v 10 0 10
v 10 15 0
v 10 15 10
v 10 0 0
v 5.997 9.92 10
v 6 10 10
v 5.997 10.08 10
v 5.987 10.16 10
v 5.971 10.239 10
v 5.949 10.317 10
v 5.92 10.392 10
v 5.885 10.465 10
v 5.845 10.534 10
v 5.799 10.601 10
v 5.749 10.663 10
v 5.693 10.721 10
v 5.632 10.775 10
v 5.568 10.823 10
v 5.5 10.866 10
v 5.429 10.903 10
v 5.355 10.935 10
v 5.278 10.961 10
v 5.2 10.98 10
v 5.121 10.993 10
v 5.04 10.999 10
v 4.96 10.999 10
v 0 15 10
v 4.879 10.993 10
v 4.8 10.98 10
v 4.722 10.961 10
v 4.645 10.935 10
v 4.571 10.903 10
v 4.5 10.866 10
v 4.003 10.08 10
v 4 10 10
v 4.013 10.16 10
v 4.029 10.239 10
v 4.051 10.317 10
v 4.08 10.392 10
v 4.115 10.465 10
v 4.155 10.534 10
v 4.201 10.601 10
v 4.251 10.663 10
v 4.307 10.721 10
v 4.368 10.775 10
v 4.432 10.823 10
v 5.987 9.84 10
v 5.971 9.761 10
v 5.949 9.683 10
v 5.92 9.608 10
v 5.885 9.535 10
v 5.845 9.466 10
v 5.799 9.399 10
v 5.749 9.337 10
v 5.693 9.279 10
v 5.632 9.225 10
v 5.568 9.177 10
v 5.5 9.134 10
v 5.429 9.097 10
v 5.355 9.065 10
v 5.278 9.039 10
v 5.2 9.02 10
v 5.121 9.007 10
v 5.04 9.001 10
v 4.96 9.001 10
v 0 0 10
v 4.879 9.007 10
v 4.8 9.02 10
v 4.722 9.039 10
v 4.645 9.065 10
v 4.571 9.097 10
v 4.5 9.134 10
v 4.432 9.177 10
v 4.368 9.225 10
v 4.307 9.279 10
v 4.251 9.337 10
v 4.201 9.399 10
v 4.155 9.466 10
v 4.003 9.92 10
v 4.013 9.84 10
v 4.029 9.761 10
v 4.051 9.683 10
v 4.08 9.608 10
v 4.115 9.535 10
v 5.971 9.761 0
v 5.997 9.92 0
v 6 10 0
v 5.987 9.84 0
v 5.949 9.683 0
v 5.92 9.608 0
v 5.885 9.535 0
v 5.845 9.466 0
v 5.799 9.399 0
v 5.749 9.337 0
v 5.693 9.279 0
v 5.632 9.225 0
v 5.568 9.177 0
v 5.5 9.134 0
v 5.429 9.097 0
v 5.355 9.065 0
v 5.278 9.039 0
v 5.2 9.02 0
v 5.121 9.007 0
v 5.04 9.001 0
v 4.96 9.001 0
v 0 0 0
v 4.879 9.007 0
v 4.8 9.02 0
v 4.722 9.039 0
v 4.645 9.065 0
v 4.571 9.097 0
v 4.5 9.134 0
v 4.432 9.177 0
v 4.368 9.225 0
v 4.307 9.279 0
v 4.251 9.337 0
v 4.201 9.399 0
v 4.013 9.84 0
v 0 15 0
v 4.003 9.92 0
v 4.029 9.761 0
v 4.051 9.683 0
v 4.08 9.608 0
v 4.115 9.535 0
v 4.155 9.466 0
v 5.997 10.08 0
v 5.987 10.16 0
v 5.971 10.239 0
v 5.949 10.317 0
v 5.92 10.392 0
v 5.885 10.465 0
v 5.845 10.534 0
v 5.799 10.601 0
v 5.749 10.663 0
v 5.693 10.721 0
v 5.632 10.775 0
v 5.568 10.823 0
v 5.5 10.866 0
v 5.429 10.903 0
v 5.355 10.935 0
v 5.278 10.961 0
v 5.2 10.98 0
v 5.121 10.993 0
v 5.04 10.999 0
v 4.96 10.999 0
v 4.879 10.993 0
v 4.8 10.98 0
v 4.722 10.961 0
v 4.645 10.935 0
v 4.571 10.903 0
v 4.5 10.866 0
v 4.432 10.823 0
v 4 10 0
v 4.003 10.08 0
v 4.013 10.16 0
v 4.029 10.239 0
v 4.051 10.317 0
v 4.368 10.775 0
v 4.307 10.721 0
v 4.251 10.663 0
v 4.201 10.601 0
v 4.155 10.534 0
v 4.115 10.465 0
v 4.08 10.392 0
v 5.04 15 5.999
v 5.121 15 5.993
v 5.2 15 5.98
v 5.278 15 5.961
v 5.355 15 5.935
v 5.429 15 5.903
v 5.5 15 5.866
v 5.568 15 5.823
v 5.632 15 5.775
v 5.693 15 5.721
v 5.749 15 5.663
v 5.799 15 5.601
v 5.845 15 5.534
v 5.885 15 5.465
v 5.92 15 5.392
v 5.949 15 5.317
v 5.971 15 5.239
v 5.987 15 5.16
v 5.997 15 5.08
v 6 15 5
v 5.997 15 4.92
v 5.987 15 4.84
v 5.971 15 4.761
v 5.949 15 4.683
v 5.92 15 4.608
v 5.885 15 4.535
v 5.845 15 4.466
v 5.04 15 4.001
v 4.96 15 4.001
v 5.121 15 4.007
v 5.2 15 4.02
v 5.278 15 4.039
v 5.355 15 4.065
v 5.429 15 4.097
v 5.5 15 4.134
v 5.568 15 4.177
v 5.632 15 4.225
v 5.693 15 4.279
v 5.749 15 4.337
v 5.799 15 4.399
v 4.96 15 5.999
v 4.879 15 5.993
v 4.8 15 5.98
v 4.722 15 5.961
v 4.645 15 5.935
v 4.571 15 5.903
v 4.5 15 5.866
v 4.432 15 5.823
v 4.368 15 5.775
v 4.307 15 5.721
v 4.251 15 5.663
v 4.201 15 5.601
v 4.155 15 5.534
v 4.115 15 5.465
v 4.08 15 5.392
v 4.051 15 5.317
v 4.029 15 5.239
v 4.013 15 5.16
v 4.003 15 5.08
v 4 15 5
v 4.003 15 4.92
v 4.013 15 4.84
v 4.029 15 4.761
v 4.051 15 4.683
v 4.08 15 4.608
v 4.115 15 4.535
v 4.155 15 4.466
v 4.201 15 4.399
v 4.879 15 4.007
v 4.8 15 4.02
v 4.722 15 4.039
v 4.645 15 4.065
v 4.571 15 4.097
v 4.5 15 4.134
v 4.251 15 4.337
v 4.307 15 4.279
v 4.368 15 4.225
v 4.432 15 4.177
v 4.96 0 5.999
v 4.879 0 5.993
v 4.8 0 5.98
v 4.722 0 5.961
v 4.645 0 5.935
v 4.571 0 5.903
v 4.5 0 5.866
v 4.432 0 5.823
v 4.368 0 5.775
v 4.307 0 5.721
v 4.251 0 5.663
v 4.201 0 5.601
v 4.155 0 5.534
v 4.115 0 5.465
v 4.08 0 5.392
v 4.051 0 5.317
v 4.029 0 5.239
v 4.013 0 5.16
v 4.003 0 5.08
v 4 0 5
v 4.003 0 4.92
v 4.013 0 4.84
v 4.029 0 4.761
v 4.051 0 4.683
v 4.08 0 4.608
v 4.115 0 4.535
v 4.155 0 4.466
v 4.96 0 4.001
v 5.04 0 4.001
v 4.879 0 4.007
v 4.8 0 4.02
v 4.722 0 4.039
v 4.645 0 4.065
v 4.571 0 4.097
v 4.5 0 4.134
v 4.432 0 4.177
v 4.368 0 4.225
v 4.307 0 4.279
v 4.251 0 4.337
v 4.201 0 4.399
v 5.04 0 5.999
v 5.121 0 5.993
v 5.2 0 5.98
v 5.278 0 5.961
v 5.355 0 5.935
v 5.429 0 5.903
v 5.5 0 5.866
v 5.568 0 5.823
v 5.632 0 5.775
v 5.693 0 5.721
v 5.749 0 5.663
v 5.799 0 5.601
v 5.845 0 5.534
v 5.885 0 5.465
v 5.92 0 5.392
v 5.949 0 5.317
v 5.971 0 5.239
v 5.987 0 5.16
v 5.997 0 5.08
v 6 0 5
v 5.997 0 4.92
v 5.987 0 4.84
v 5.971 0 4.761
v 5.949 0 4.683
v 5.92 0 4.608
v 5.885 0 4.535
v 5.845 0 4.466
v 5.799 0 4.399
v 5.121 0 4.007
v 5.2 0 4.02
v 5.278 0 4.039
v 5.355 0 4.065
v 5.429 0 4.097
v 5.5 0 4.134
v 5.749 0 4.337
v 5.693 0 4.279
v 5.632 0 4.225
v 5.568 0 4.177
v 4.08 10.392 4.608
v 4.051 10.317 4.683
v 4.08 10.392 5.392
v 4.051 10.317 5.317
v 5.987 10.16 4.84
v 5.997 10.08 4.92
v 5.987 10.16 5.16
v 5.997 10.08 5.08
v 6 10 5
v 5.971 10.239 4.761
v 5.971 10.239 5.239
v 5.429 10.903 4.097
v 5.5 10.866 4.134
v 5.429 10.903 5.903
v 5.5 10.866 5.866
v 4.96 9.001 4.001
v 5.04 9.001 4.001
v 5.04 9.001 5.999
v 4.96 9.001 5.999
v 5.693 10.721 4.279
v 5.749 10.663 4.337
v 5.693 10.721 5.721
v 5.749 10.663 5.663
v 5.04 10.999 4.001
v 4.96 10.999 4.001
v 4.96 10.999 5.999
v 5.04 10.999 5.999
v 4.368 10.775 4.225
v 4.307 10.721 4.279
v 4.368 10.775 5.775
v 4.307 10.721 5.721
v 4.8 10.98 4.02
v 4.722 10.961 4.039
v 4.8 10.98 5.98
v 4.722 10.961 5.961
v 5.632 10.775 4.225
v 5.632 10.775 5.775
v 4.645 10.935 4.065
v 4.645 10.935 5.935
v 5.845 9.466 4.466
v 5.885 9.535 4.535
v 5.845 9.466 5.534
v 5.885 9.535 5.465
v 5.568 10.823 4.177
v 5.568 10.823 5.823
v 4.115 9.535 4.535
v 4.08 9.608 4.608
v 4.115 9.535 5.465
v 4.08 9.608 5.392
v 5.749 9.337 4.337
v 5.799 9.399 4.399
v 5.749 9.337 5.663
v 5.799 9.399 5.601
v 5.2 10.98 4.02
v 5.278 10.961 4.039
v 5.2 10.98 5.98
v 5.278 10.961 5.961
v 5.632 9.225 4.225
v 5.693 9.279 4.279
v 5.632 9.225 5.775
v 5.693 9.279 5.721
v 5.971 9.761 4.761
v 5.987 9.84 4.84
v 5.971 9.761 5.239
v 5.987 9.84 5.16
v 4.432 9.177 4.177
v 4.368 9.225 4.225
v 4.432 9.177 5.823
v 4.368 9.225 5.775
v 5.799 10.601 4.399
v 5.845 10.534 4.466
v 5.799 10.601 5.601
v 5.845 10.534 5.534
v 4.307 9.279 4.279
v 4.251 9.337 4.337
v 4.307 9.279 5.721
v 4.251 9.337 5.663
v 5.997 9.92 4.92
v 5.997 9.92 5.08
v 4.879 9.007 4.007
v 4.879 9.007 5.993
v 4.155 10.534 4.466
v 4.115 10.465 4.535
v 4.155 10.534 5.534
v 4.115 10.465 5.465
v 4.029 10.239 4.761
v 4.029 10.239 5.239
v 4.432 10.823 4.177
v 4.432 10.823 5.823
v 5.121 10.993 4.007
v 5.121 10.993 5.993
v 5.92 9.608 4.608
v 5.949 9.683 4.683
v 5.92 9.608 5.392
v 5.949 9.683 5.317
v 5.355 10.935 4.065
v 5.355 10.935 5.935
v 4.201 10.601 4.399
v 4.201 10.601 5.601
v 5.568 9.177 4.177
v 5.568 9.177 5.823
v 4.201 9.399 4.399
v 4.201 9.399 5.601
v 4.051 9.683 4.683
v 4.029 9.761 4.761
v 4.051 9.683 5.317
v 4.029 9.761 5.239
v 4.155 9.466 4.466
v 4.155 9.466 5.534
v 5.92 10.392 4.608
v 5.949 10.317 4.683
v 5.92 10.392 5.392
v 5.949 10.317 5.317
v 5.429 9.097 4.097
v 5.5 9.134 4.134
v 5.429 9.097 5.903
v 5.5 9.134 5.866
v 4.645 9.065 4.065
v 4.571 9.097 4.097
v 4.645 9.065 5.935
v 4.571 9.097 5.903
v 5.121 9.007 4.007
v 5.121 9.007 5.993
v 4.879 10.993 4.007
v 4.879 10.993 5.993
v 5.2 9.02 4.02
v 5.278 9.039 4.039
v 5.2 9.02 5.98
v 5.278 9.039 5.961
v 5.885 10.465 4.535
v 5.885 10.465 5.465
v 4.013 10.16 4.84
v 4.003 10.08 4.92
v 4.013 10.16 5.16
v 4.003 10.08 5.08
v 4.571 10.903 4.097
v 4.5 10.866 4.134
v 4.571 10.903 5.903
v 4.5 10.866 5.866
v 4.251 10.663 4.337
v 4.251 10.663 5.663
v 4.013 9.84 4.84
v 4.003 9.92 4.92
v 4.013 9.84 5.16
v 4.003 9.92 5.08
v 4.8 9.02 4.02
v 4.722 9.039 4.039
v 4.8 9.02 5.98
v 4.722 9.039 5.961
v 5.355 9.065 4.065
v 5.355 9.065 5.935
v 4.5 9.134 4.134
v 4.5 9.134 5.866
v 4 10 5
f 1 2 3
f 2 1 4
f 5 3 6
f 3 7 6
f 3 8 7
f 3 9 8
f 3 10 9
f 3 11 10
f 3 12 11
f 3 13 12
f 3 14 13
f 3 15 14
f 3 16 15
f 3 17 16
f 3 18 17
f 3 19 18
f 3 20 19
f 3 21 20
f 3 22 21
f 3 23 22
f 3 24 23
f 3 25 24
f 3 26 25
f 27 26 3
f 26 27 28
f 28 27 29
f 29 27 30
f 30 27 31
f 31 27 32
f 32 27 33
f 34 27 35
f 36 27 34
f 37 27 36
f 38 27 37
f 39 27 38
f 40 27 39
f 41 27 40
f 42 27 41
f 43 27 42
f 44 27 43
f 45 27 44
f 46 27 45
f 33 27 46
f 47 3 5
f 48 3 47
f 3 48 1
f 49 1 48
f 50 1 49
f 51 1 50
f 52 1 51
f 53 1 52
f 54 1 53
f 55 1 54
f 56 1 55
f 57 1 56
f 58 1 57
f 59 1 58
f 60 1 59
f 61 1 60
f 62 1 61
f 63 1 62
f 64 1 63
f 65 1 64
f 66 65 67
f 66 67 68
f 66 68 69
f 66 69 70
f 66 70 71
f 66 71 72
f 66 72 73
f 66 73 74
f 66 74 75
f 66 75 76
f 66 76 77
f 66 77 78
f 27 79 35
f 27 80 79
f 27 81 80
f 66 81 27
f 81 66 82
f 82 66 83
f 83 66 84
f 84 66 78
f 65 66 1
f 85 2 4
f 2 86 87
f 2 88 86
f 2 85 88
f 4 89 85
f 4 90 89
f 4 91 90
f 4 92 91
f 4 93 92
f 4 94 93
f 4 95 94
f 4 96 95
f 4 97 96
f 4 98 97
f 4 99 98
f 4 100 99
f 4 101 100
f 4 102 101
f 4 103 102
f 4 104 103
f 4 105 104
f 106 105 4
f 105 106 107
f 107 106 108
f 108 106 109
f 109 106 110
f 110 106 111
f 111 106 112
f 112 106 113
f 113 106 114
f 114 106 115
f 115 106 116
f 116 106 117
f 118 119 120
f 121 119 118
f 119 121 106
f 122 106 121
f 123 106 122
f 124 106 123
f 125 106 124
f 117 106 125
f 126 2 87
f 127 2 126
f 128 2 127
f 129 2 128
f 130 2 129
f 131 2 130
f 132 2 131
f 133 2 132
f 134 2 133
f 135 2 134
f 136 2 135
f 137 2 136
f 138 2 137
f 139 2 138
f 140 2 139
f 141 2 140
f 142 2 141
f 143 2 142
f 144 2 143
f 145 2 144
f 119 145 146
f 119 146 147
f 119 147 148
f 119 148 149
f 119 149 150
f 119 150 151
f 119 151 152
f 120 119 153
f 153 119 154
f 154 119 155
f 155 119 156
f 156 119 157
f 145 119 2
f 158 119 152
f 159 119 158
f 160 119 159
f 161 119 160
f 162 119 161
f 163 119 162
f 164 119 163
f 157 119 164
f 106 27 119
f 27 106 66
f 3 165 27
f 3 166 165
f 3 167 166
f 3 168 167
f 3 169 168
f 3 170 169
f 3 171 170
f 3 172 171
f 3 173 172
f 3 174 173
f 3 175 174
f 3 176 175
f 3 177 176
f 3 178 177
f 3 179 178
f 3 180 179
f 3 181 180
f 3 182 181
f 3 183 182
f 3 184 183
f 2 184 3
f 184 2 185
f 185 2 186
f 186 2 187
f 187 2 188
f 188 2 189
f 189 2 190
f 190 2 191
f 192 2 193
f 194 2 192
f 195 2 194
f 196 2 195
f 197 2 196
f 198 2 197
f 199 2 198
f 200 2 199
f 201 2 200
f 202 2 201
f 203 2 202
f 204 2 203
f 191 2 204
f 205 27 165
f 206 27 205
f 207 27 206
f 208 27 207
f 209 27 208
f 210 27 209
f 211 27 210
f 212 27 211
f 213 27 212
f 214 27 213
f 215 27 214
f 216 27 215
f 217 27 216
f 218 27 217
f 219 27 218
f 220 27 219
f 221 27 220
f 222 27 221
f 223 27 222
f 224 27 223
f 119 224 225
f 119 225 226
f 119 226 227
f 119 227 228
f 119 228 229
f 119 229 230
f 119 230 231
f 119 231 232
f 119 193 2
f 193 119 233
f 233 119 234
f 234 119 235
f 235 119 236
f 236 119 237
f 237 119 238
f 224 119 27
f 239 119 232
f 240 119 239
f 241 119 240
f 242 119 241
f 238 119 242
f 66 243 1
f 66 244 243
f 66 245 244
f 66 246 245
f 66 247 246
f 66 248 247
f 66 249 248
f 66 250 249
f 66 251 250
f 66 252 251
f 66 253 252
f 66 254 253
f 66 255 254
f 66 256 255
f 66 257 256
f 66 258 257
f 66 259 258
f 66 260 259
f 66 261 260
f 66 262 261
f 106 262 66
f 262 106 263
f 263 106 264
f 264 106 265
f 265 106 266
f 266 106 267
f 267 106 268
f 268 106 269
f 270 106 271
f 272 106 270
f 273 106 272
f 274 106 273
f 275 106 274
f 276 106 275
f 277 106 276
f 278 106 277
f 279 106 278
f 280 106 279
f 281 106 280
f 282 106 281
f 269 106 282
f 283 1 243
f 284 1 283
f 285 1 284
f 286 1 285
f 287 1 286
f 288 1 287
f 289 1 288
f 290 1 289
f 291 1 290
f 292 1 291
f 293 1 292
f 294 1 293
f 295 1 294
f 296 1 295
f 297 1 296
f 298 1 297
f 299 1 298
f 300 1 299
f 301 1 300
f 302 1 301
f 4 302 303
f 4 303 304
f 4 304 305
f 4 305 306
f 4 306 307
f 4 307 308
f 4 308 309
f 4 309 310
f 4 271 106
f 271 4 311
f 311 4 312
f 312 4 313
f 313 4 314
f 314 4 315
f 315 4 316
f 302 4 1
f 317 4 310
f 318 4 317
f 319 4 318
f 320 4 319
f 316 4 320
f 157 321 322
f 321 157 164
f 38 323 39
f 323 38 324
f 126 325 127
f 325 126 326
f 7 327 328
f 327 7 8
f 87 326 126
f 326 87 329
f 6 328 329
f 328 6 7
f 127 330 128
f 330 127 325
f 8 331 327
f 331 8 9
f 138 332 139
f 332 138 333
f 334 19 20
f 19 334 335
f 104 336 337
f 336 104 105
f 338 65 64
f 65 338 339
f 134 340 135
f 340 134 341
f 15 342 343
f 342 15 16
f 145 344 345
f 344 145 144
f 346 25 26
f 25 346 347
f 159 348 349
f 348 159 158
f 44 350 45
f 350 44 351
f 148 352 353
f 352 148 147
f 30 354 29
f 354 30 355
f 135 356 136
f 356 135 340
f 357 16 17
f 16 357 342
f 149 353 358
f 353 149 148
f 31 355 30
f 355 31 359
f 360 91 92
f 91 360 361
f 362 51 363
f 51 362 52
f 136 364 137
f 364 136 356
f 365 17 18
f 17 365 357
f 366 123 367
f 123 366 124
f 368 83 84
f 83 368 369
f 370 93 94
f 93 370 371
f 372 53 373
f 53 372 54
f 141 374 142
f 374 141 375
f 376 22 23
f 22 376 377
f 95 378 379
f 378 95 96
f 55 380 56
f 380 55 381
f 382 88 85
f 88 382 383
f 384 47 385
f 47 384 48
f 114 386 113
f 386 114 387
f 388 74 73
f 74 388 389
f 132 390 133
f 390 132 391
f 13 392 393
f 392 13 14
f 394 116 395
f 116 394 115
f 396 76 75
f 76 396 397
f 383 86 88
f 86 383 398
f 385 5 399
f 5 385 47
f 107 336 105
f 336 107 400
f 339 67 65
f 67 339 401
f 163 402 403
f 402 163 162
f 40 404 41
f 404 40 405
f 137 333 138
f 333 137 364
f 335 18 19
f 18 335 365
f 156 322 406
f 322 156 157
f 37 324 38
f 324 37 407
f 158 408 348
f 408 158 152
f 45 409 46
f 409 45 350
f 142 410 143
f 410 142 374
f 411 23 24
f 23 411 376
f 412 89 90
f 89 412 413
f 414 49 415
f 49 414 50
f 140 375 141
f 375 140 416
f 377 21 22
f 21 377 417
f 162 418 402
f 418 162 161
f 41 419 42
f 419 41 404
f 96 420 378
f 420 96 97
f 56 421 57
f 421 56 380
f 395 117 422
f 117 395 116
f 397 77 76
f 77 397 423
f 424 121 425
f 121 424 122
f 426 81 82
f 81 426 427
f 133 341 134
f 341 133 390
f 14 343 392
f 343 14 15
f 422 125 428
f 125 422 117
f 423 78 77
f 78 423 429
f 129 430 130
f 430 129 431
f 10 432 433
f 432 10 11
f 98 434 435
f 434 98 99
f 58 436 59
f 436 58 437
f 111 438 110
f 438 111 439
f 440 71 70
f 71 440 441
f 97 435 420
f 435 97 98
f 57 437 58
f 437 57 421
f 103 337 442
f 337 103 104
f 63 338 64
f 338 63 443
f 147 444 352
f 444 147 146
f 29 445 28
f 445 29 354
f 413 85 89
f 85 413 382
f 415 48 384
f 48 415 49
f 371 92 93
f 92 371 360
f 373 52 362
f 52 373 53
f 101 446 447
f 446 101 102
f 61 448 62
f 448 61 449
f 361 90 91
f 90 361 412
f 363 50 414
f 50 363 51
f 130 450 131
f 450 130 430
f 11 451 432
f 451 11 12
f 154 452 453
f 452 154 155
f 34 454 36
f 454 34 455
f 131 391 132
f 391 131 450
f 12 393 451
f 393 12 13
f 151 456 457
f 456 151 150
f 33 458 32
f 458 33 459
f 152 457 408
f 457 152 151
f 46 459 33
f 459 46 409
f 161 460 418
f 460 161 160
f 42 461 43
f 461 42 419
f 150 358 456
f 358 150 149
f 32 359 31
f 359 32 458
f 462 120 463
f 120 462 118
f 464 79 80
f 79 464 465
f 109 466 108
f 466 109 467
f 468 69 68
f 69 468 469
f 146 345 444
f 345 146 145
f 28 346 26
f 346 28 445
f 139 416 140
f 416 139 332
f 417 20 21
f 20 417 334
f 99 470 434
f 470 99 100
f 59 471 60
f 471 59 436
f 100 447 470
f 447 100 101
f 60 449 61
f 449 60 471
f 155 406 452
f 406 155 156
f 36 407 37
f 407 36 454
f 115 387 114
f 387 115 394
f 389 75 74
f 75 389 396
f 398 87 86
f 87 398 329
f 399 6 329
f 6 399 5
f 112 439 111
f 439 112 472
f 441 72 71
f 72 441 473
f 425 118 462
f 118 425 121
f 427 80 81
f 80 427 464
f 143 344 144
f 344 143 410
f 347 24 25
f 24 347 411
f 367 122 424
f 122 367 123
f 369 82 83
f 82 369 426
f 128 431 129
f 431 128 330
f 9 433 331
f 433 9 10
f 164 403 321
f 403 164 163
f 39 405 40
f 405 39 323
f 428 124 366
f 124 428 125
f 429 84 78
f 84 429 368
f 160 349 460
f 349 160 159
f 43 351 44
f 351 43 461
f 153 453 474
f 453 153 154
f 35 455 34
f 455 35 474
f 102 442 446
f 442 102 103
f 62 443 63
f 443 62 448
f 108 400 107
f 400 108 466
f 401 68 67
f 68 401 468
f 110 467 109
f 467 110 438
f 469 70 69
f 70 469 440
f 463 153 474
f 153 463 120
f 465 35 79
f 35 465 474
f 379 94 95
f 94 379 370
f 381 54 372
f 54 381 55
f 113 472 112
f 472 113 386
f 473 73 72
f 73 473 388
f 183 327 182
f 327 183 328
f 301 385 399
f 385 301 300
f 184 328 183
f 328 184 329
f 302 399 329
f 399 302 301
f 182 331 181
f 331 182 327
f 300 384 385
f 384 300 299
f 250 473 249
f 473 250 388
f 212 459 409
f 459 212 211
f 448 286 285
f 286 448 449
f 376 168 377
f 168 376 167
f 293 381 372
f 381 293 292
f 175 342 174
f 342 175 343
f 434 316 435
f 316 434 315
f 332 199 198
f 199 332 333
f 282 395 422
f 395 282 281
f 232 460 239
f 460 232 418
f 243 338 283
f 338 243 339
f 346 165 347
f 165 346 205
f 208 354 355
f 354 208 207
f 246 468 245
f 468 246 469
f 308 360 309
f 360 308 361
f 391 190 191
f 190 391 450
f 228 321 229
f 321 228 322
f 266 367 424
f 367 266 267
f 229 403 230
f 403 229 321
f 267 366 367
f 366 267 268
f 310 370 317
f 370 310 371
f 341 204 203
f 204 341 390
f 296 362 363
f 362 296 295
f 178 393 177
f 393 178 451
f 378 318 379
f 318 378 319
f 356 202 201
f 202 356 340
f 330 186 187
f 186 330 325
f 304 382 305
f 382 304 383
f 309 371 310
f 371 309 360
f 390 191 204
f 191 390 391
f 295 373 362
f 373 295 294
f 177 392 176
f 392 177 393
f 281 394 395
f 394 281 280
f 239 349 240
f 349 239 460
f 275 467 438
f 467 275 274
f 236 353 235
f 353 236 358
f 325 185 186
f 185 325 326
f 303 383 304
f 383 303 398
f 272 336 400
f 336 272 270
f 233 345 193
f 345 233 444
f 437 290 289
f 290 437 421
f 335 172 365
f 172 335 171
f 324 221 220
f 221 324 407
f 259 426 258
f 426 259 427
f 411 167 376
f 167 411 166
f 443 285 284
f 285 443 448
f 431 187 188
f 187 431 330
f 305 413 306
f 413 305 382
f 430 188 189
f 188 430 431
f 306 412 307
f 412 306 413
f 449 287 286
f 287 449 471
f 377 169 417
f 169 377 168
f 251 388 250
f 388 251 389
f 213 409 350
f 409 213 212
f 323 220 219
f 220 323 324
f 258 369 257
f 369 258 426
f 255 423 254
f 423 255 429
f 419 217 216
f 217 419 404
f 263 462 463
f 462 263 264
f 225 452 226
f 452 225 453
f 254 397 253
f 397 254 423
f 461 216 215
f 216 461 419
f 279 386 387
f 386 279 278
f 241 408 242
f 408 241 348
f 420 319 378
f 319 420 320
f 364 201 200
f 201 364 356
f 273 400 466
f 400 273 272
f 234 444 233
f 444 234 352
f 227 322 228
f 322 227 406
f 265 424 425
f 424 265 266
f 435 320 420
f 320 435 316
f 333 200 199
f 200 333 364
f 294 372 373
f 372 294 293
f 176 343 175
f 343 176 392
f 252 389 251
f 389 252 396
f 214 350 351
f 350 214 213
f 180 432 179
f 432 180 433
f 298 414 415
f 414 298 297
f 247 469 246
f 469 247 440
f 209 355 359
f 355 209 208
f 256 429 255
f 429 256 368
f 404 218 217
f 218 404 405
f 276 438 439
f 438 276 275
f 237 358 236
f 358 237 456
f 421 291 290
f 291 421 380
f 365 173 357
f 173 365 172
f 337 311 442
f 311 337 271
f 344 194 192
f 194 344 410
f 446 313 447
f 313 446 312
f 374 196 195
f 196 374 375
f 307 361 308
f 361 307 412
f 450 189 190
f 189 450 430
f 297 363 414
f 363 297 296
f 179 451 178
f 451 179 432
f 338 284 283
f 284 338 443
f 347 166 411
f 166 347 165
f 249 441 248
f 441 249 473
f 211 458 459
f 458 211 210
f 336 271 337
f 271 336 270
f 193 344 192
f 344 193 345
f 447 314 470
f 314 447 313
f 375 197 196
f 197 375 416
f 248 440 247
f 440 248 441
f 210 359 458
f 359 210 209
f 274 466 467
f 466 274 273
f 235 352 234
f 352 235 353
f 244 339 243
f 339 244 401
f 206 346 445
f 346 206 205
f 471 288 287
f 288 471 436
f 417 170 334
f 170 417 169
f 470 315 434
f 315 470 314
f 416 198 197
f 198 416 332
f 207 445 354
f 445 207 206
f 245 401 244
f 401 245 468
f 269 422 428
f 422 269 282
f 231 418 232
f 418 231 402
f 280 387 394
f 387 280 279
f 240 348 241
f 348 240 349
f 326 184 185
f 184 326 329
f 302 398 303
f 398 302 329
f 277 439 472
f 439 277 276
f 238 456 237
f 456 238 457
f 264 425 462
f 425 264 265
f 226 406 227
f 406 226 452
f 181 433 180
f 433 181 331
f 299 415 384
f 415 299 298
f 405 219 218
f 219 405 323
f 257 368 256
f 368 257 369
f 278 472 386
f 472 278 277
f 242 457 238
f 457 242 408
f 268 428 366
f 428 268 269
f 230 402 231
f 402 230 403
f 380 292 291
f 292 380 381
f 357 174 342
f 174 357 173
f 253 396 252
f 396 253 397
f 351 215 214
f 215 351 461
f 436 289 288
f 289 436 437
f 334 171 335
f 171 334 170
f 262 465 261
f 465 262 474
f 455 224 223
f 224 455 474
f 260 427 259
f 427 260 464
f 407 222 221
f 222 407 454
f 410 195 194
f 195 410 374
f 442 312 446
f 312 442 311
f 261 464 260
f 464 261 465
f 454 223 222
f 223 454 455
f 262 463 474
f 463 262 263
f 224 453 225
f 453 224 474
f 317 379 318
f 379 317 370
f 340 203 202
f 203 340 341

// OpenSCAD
line_width=0.08;
facets = (PI * 2) / line_width; //2mm dia

difference() {
    cube([10,15,10]);
    translate([5,10,0]) 
        cylinder(h=20, r=1, $fn=facets);
    
    rotate([90, 0, 0])
        translate([5,5,-16])
            cylinder(h=17, r=1, $fn=facets);

};
